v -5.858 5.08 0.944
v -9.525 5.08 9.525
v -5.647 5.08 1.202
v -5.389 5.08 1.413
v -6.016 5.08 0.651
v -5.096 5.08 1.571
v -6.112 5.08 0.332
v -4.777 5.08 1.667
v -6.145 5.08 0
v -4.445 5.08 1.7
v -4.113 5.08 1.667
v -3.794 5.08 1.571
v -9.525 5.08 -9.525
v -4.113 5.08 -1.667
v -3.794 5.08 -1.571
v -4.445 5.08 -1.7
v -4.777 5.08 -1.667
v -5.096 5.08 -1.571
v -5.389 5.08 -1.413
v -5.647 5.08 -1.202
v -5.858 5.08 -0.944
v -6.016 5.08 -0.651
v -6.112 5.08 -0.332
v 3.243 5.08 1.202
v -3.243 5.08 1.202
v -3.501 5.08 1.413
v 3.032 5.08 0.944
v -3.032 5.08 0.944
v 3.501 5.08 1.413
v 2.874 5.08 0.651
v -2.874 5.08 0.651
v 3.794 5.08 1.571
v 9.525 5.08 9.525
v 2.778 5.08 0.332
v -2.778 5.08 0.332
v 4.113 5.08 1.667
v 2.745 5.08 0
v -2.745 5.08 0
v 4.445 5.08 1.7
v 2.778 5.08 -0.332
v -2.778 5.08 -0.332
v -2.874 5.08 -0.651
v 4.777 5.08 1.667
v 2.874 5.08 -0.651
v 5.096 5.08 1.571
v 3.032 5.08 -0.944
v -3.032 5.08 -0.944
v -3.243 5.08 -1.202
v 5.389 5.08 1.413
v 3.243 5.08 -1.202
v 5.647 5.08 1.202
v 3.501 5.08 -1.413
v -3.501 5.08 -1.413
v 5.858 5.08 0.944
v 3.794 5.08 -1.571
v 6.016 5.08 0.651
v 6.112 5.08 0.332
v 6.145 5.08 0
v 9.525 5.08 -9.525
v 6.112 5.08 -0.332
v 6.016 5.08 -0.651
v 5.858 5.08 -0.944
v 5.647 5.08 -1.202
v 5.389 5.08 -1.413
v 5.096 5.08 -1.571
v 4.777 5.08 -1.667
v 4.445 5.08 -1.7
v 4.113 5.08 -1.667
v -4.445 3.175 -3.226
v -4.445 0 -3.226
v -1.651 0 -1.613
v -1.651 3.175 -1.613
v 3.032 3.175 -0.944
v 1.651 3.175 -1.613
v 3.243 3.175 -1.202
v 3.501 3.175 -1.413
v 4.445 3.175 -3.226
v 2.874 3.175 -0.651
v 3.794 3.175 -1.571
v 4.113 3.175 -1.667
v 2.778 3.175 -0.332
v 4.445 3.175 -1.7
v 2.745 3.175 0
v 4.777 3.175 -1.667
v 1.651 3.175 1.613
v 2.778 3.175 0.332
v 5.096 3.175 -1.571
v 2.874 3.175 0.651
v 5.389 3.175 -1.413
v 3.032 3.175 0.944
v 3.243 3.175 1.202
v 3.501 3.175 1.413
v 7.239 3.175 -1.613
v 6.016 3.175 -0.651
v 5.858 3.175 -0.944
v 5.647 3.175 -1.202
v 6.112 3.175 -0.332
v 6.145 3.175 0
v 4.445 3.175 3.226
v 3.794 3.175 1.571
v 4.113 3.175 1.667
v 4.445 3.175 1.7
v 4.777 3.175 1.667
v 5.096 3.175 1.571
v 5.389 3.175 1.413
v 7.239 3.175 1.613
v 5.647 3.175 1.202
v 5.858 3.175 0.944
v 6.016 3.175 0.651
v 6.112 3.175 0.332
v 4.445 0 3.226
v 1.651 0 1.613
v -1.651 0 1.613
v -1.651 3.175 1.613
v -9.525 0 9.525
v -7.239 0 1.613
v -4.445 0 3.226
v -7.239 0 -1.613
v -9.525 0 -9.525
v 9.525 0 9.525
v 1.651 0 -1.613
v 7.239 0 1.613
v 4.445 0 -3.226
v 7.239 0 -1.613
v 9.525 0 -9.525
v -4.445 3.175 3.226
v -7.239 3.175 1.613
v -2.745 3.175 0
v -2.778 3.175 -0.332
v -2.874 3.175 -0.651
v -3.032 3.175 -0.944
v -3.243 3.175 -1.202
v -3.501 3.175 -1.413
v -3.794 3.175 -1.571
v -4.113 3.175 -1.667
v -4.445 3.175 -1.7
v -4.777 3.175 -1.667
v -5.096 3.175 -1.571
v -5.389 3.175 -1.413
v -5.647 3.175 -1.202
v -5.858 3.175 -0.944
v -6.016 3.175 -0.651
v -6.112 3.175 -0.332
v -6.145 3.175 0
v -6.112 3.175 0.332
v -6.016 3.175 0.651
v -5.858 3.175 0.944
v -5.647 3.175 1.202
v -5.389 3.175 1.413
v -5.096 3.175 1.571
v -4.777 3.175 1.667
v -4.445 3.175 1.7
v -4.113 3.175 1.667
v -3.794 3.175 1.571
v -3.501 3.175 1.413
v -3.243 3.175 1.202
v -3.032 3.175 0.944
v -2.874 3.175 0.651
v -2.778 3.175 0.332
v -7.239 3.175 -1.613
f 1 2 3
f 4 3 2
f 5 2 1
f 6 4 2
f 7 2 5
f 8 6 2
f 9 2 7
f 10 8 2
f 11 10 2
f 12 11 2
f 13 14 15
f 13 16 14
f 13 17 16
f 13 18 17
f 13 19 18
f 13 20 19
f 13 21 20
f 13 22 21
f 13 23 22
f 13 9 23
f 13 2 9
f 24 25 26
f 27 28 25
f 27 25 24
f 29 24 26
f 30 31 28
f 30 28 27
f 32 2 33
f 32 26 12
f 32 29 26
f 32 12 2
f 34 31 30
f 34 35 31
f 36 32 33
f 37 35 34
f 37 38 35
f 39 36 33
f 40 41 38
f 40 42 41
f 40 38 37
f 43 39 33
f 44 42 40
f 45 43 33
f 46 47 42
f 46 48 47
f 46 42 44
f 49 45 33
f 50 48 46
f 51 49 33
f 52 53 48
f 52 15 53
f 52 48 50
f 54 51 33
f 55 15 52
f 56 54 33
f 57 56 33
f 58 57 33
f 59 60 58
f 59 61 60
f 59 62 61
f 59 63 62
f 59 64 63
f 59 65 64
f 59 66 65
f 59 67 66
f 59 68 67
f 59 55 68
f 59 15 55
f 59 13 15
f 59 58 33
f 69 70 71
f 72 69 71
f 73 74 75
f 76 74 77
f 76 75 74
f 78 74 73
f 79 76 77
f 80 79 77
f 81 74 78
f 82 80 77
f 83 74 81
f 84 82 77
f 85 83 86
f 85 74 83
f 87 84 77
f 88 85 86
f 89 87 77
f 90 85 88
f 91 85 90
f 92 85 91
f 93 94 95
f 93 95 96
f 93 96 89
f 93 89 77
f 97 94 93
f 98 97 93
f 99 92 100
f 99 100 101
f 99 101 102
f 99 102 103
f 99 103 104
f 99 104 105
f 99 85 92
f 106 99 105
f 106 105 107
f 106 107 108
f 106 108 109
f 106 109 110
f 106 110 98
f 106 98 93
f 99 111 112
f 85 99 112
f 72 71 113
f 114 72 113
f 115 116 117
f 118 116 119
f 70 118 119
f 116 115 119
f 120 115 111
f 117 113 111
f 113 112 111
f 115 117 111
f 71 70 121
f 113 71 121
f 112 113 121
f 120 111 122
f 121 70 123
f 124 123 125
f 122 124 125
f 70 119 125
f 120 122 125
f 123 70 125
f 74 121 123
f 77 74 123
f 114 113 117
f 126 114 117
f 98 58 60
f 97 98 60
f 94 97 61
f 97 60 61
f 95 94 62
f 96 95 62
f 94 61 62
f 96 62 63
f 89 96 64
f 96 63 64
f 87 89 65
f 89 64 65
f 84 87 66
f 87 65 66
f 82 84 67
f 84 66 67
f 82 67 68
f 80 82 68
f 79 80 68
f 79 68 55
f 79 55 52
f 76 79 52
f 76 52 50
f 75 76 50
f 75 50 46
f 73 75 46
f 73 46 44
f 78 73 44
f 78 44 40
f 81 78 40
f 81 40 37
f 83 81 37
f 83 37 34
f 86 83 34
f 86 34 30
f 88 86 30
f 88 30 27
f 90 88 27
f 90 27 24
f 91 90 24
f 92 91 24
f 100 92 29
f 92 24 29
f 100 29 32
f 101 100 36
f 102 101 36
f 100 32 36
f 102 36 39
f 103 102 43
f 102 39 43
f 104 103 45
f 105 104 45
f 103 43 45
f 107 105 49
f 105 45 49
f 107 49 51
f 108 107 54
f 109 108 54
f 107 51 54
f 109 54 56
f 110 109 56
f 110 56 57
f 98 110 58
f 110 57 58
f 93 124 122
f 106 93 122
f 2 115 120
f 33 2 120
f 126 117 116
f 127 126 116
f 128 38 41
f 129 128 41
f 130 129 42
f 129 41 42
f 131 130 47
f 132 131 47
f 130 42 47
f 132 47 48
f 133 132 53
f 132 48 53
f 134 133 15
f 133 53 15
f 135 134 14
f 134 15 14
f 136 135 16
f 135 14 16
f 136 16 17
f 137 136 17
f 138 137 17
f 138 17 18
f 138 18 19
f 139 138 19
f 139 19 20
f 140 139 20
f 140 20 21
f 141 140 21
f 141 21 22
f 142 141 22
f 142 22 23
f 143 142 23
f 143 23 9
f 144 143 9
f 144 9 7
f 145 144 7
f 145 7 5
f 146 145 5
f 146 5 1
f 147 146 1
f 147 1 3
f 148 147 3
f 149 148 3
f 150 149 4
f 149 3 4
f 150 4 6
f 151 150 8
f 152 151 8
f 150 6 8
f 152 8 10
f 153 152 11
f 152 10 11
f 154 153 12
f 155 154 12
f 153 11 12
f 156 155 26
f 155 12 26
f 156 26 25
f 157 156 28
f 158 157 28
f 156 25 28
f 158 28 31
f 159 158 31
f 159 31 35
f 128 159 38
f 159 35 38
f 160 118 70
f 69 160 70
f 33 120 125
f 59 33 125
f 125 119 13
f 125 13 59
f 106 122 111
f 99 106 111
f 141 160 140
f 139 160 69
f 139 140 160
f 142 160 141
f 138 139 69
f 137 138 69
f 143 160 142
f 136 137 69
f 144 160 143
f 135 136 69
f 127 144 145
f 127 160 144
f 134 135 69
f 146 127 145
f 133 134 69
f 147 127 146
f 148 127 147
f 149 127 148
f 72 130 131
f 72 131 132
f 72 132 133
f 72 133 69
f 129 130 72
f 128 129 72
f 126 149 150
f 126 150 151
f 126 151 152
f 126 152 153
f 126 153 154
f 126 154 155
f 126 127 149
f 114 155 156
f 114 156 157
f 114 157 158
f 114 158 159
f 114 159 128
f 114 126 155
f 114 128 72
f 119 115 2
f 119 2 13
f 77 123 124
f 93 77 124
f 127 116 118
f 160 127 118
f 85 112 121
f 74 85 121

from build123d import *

# Parameters (mm, degrees)
SKETCH1_W            = 19.05
SKETCH1_H            = 19.05
BOSS_EXTRUDE1_DEPTH  = 5.08
M3_CLEARANCE_HOLE1_D = 3.4
CUT_EXTRUDE2_DEPTH   = 3.175


with BuildPart() as part:
    # Sketch1 → Boss-Extrude1 (new body)
    with BuildSketch(Plane(origin=(0, 0, 0), x_dir=(1, 0, 0), z_dir=(0, 1, 0))):
        Rectangle(SKETCH1_W, SKETCH1_H)
    extrude(amount=BOSS_EXTRUDE1_DEPTH)

    # M3 Clearance Hole1 (through all)
    with Locations(Plane(origin=(0, 0, 0), x_dir=(-1, 0, 0), z_dir=(0, -1, 0))):
        with Locations((-4.445, 0), (4.445, 0)):
            Hole(M3_CLEARANCE_HOLE1_D / 2)

    # Sketch8 → Cut-Extrude2 (cut)
    with BuildSketch(Plane.XZ):
        Polygon((-7.239, -1.613116652), (-4.445, -3.226233304), (-1.651, -1.613116652), (-1.651, 1.613116652), (-4.445, 3.226233304), (-7.239, 1.613116652), align=None)
        Polygon((7.239, -1.613116652), (7.239, 1.613116652), (4.445, 3.226233304), (1.651, 1.613116652), (1.651, -1.613116652), (4.445, -3.226233304), align=None)
    extrude(amount=-CUT_EXTRUDE2_DEPTH, mode=Mode.SUBTRACT)


solid = part.part
